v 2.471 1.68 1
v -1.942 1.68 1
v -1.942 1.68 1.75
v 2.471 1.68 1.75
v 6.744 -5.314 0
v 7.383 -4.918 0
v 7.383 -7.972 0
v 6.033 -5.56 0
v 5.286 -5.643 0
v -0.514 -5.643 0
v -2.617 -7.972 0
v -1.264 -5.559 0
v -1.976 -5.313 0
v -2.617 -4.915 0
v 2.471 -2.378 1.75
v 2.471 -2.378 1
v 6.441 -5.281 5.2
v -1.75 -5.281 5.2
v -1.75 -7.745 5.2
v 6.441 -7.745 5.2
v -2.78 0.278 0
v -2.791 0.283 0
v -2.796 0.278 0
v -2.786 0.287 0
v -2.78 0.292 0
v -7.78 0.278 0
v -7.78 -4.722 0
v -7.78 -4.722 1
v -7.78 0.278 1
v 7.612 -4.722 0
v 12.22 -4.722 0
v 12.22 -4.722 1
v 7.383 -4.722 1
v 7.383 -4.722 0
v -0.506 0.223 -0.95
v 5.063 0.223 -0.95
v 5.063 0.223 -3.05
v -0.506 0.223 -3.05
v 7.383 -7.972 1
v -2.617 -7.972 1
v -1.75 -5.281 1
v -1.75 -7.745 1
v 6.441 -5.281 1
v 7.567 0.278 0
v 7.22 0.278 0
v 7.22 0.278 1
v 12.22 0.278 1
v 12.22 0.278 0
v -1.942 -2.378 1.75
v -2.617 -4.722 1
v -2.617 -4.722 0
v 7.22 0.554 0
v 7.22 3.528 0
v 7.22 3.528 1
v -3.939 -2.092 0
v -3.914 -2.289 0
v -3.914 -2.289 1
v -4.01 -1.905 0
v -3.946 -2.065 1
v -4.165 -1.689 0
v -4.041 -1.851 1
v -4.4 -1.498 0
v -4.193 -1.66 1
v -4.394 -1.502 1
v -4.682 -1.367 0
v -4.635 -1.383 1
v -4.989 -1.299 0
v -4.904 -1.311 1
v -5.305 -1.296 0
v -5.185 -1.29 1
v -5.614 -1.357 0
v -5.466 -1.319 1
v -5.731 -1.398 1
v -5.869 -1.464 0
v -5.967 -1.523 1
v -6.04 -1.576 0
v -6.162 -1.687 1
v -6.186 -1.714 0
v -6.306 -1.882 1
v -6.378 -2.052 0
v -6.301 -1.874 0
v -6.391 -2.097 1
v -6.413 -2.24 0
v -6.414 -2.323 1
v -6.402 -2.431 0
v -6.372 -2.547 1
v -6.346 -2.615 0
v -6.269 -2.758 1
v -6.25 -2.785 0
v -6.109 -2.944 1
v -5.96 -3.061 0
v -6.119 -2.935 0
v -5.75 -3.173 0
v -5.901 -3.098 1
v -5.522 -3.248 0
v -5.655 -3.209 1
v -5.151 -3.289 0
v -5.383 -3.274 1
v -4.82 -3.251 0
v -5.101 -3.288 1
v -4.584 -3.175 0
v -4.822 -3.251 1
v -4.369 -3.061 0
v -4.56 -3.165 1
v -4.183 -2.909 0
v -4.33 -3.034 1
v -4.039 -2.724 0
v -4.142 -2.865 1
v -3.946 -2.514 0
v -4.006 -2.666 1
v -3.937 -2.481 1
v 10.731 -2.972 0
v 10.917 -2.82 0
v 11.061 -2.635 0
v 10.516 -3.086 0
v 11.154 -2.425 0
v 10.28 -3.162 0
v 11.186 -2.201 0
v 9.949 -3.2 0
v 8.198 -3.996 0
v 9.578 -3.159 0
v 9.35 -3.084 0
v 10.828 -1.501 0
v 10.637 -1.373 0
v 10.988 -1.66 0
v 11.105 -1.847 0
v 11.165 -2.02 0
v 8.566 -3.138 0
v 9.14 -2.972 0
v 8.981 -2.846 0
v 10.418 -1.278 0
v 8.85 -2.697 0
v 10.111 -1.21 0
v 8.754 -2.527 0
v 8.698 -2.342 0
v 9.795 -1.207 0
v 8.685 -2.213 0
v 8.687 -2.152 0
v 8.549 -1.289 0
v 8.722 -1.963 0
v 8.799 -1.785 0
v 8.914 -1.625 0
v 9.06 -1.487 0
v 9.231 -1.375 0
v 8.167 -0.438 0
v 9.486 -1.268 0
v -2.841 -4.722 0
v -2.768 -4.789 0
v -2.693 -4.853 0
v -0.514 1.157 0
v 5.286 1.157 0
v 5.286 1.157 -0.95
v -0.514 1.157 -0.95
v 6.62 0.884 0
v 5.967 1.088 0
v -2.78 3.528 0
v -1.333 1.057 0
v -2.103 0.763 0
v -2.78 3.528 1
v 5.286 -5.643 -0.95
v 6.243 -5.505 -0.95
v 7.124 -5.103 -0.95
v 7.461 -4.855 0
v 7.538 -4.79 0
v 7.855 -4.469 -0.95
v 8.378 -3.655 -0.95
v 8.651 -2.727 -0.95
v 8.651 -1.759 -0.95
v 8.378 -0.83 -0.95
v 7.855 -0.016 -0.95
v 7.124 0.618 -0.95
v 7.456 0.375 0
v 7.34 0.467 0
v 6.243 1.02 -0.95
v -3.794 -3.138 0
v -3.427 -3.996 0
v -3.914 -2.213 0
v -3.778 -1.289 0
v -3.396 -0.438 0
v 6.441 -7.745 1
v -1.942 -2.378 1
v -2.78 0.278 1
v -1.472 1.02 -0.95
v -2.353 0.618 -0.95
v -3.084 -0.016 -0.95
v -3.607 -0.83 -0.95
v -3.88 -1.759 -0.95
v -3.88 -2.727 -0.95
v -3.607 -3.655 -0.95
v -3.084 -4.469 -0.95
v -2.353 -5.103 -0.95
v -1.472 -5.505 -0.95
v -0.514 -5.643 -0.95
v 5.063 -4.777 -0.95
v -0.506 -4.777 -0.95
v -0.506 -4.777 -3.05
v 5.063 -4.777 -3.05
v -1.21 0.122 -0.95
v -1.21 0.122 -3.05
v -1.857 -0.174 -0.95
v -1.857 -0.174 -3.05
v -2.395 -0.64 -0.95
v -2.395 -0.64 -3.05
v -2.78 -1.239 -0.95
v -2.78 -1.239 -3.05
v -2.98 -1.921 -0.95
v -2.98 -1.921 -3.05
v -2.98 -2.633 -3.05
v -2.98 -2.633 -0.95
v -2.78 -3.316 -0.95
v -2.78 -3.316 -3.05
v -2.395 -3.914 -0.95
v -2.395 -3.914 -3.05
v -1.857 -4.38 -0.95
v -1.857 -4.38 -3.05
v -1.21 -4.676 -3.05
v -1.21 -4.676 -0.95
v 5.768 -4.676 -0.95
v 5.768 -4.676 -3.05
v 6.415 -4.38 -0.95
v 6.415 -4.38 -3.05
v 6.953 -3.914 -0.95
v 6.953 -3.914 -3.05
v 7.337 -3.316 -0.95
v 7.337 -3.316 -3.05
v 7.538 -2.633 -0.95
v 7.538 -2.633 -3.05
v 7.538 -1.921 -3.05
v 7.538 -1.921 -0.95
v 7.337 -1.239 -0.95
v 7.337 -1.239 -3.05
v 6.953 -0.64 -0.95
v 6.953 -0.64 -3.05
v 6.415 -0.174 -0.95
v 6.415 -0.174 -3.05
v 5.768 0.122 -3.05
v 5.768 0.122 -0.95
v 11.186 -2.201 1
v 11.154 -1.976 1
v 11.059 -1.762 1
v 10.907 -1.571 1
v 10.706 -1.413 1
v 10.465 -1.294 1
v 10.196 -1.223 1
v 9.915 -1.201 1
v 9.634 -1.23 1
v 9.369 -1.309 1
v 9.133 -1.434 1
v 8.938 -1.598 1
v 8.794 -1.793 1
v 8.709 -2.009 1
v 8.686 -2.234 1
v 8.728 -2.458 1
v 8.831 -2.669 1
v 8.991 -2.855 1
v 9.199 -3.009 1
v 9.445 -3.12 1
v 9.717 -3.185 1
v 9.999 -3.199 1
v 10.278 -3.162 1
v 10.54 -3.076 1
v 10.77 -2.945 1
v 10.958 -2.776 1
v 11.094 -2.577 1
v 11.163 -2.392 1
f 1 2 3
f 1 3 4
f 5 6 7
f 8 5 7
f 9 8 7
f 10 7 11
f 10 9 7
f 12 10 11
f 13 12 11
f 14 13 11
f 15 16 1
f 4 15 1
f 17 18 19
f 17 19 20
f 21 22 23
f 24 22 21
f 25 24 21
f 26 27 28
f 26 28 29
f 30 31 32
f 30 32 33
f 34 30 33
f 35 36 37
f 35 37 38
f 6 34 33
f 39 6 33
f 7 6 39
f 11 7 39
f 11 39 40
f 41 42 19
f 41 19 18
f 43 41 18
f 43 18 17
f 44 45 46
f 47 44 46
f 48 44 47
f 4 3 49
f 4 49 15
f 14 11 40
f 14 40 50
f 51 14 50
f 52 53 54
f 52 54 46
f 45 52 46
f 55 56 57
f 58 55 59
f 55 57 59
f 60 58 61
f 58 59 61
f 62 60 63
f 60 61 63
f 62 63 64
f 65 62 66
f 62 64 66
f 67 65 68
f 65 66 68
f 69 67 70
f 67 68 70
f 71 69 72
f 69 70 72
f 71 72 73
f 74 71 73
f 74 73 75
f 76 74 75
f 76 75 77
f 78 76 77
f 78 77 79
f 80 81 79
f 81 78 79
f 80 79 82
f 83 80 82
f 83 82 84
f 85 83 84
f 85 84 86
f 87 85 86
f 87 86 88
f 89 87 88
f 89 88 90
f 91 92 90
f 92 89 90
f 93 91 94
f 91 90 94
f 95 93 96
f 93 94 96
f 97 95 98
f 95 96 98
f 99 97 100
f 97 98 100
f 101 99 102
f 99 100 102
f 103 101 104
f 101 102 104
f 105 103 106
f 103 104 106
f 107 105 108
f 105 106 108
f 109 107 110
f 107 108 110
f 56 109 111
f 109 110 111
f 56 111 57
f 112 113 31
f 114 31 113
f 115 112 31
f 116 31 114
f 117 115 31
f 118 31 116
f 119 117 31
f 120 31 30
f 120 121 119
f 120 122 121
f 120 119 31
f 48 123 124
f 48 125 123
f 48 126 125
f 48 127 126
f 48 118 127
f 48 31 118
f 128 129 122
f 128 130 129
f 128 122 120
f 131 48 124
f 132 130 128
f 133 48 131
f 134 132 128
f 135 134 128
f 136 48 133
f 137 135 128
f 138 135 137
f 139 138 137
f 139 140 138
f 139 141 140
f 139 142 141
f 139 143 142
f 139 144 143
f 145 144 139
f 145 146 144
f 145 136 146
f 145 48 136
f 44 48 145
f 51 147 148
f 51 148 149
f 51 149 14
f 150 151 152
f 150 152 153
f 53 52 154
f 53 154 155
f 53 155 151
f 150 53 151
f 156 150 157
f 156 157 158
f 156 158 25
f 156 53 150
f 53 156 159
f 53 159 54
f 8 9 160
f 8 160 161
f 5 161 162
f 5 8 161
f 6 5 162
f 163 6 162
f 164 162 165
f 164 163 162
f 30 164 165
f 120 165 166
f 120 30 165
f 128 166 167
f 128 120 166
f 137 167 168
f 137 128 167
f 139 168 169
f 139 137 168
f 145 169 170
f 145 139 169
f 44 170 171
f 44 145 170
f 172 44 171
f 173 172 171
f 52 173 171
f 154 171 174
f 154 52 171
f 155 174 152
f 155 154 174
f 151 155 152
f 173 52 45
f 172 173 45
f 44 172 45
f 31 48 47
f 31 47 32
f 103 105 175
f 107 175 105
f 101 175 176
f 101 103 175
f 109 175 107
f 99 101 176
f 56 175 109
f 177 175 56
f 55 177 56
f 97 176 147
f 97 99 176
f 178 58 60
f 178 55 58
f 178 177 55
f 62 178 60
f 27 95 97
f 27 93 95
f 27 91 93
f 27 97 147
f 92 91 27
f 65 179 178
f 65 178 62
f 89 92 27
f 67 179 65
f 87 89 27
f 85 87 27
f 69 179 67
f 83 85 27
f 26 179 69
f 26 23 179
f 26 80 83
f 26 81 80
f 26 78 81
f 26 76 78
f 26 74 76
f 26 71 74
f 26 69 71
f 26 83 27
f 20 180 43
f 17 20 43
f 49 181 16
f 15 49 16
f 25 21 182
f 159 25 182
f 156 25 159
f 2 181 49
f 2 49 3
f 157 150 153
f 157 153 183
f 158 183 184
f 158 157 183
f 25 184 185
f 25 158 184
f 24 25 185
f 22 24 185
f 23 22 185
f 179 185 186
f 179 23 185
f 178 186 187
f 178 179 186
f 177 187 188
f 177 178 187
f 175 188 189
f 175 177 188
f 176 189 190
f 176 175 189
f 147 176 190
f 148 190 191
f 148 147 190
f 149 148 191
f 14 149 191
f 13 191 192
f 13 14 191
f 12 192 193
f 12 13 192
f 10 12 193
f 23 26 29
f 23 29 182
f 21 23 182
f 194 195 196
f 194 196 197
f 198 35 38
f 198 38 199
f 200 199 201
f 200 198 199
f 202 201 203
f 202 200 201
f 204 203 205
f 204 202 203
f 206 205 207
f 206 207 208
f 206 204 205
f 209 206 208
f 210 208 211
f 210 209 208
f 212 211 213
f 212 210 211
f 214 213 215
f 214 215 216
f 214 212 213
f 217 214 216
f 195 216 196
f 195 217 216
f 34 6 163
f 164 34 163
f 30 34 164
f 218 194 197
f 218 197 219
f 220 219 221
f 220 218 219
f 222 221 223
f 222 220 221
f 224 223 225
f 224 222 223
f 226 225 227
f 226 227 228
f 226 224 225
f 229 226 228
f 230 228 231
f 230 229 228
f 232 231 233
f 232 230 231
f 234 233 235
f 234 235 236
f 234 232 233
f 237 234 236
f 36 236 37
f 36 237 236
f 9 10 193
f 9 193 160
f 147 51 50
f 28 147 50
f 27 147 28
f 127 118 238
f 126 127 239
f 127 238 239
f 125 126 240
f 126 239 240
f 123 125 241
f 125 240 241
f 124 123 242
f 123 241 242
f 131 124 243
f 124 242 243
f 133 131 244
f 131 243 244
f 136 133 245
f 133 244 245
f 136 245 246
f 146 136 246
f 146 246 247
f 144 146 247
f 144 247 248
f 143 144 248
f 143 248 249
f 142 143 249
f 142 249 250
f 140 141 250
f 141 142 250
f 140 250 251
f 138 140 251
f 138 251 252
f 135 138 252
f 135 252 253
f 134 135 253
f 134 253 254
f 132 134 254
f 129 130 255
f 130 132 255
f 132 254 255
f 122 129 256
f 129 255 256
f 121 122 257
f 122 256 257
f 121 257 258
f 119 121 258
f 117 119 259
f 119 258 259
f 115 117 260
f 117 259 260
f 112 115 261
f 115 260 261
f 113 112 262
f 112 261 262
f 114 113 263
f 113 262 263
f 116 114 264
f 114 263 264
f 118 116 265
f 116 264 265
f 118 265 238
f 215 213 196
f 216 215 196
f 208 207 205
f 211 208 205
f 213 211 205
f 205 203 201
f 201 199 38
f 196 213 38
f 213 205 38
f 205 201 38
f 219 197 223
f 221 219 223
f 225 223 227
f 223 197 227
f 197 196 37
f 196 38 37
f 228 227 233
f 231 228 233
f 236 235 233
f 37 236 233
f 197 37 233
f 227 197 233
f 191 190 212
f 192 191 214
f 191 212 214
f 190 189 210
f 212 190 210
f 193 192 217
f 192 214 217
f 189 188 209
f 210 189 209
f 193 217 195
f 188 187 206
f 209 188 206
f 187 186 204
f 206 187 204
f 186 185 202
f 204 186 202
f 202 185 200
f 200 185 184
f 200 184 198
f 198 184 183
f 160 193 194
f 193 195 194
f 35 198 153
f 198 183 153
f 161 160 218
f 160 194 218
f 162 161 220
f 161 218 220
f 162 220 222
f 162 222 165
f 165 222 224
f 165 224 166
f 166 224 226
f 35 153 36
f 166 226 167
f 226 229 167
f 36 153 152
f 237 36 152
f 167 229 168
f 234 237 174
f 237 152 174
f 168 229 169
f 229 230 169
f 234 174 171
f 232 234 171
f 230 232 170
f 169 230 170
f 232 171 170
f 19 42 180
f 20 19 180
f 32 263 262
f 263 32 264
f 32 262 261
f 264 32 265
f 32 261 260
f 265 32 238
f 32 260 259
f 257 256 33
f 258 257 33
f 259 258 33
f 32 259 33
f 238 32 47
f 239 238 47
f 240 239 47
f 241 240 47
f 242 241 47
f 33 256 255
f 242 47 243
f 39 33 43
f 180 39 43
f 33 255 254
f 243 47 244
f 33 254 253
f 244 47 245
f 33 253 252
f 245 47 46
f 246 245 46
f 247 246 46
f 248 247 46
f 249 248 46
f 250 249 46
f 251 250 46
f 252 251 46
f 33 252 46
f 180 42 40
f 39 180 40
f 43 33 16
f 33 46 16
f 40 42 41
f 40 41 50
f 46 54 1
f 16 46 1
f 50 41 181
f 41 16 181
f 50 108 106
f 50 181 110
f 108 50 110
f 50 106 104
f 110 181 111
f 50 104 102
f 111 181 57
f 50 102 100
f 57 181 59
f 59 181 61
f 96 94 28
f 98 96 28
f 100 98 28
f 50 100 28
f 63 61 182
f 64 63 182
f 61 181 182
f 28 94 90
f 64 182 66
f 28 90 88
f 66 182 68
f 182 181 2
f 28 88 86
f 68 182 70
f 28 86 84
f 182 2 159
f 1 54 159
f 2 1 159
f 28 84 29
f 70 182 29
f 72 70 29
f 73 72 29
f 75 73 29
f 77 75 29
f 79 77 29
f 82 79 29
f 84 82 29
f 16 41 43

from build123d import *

# Parameters (mm, degrees)
BOSS_EXTRUDE1_DEPTH = 1
SKETCH2_RX          = 1.25
SKETCH2_RY          = 1
CUT_EXTRUDE1_DEPTH  = 15.62450684
BOSS_EXTRUDE2_DEPTH = 0.95
BOSS_EXTRUDE3_DEPTH = 2.1
SKETCH7_W           = 8.190854722
SKETCH7_H           = 2.464294839
BOSS_EXTRUDE4_DEPTH = 4.2
SKETCH8_W           = 4.413735787
SKETCH8_H           = 4.058267134
BOSS_EXTRUDE5_DEPTH = 0.75


with BuildPart() as part:
    # Sketch1 → Boss-Extrude1 (new body)
    with BuildSketch(Plane.XY):
        Polygon((-2.780385667, 3.527721413), (7.219614333, 3.527721413), (7.219614333, 0.277721413), (12.219614333, 0.277721413), (12.219614333, -4.722278587), (7.383278363, -4.722278587), (7.383278363, -7.972278587), (-2.616721637, -7.972278587), (-2.616721637, -4.722278587), (-7.780385667, -4.722278587), (-7.780385667, 0.277721413), (-2.780385667, 0.277721413), align=None)
    extrude(amount=BOSS_EXTRUDE1_DEPTH)

    # Sketch2 → Cut-Extrude1 (cut, through all)
    with BuildSketch(Plane.XY.offset(1)):
        with Locations((9.935757543, -2.200550618)):
            Ellipse(SKETCH2_RX, SKETCH2_RY)
        with Locations(Location((-5.164242457, -2.289417781), (0, 0, 0))):
            Ellipse(SKETCH2_RX, SKETCH2_RY)
    extrude(amount=-CUT_EXTRUDE1_DEPTH, mode=Mode.SUBTRACT)

    # Sketch5 → Boss-Extrude2 (add)
    with BuildSketch(Plane(origin=(0, 0, 0), x_dir=(-1, 0, 0), z_dir=(0, 0, -1))):
        with BuildLine():
            Line((-5.285531474, 1.157258951), (0.514468526, 1.157258951))
            ThreePointArc((0.514468526, 1.157258951), (3.914468526, -2.242741049), (0.514468526, -5.642741049))
            Line((0.514468526, -5.642741049), (-5.285531474, -5.642741049))
            ThreePointArc((-5.285531474, -5.642741049), (-8.685531474, -2.242741049), (-5.285531474, 1.157258951))
        make_face()
    extrude(amount=BOSS_EXTRUDE2_DEPTH)

    # Sketch6 → Boss-Extrude3 (add)
    with BuildSketch(Plane(origin=(0, 0, -0.95), x_dir=(-1, 0, 0), z_dir=(0, 0, -1))):
        with BuildLine():
            Line((-5.063363565, 0.222790462), (0.505645348, 0.222790462))
            ThreePointArc((0.505645348, 0.222790462), (3.005645348, -2.277209538), (0.505645348, -4.777209538))
            Line((0.505645348, -4.777209538), (-5.063363565, -4.777209538))
            ThreePointArc((-5.063363565, -4.777209538), (-7.563363565, -2.277209538), (-5.063363565, 0.222790462))
        make_face()
    extrude(amount=BOSS_EXTRUDE3_DEPTH)

    # Sketch7 → Boss-Extrude4 (add)
    with BuildSketch(Plane.XY.offset(1)):
        with Locations((2.345641724, -6.512937551)):
            Rectangle(SKETCH7_W, SKETCH7_H)
    extrude(amount=BOSS_EXTRUDE4_DEPTH)

    # Sketch8 → Boss-Extrude5 (add)
    with BuildSketch(Plane.XY.offset(1)):
        with Locations((0.264536736, -0.348662557)):
            Rectangle(SKETCH8_W, SKETCH8_H)
    extrude(amount=BOSS_EXTRUDE5_DEPTH)


solid = part.part
